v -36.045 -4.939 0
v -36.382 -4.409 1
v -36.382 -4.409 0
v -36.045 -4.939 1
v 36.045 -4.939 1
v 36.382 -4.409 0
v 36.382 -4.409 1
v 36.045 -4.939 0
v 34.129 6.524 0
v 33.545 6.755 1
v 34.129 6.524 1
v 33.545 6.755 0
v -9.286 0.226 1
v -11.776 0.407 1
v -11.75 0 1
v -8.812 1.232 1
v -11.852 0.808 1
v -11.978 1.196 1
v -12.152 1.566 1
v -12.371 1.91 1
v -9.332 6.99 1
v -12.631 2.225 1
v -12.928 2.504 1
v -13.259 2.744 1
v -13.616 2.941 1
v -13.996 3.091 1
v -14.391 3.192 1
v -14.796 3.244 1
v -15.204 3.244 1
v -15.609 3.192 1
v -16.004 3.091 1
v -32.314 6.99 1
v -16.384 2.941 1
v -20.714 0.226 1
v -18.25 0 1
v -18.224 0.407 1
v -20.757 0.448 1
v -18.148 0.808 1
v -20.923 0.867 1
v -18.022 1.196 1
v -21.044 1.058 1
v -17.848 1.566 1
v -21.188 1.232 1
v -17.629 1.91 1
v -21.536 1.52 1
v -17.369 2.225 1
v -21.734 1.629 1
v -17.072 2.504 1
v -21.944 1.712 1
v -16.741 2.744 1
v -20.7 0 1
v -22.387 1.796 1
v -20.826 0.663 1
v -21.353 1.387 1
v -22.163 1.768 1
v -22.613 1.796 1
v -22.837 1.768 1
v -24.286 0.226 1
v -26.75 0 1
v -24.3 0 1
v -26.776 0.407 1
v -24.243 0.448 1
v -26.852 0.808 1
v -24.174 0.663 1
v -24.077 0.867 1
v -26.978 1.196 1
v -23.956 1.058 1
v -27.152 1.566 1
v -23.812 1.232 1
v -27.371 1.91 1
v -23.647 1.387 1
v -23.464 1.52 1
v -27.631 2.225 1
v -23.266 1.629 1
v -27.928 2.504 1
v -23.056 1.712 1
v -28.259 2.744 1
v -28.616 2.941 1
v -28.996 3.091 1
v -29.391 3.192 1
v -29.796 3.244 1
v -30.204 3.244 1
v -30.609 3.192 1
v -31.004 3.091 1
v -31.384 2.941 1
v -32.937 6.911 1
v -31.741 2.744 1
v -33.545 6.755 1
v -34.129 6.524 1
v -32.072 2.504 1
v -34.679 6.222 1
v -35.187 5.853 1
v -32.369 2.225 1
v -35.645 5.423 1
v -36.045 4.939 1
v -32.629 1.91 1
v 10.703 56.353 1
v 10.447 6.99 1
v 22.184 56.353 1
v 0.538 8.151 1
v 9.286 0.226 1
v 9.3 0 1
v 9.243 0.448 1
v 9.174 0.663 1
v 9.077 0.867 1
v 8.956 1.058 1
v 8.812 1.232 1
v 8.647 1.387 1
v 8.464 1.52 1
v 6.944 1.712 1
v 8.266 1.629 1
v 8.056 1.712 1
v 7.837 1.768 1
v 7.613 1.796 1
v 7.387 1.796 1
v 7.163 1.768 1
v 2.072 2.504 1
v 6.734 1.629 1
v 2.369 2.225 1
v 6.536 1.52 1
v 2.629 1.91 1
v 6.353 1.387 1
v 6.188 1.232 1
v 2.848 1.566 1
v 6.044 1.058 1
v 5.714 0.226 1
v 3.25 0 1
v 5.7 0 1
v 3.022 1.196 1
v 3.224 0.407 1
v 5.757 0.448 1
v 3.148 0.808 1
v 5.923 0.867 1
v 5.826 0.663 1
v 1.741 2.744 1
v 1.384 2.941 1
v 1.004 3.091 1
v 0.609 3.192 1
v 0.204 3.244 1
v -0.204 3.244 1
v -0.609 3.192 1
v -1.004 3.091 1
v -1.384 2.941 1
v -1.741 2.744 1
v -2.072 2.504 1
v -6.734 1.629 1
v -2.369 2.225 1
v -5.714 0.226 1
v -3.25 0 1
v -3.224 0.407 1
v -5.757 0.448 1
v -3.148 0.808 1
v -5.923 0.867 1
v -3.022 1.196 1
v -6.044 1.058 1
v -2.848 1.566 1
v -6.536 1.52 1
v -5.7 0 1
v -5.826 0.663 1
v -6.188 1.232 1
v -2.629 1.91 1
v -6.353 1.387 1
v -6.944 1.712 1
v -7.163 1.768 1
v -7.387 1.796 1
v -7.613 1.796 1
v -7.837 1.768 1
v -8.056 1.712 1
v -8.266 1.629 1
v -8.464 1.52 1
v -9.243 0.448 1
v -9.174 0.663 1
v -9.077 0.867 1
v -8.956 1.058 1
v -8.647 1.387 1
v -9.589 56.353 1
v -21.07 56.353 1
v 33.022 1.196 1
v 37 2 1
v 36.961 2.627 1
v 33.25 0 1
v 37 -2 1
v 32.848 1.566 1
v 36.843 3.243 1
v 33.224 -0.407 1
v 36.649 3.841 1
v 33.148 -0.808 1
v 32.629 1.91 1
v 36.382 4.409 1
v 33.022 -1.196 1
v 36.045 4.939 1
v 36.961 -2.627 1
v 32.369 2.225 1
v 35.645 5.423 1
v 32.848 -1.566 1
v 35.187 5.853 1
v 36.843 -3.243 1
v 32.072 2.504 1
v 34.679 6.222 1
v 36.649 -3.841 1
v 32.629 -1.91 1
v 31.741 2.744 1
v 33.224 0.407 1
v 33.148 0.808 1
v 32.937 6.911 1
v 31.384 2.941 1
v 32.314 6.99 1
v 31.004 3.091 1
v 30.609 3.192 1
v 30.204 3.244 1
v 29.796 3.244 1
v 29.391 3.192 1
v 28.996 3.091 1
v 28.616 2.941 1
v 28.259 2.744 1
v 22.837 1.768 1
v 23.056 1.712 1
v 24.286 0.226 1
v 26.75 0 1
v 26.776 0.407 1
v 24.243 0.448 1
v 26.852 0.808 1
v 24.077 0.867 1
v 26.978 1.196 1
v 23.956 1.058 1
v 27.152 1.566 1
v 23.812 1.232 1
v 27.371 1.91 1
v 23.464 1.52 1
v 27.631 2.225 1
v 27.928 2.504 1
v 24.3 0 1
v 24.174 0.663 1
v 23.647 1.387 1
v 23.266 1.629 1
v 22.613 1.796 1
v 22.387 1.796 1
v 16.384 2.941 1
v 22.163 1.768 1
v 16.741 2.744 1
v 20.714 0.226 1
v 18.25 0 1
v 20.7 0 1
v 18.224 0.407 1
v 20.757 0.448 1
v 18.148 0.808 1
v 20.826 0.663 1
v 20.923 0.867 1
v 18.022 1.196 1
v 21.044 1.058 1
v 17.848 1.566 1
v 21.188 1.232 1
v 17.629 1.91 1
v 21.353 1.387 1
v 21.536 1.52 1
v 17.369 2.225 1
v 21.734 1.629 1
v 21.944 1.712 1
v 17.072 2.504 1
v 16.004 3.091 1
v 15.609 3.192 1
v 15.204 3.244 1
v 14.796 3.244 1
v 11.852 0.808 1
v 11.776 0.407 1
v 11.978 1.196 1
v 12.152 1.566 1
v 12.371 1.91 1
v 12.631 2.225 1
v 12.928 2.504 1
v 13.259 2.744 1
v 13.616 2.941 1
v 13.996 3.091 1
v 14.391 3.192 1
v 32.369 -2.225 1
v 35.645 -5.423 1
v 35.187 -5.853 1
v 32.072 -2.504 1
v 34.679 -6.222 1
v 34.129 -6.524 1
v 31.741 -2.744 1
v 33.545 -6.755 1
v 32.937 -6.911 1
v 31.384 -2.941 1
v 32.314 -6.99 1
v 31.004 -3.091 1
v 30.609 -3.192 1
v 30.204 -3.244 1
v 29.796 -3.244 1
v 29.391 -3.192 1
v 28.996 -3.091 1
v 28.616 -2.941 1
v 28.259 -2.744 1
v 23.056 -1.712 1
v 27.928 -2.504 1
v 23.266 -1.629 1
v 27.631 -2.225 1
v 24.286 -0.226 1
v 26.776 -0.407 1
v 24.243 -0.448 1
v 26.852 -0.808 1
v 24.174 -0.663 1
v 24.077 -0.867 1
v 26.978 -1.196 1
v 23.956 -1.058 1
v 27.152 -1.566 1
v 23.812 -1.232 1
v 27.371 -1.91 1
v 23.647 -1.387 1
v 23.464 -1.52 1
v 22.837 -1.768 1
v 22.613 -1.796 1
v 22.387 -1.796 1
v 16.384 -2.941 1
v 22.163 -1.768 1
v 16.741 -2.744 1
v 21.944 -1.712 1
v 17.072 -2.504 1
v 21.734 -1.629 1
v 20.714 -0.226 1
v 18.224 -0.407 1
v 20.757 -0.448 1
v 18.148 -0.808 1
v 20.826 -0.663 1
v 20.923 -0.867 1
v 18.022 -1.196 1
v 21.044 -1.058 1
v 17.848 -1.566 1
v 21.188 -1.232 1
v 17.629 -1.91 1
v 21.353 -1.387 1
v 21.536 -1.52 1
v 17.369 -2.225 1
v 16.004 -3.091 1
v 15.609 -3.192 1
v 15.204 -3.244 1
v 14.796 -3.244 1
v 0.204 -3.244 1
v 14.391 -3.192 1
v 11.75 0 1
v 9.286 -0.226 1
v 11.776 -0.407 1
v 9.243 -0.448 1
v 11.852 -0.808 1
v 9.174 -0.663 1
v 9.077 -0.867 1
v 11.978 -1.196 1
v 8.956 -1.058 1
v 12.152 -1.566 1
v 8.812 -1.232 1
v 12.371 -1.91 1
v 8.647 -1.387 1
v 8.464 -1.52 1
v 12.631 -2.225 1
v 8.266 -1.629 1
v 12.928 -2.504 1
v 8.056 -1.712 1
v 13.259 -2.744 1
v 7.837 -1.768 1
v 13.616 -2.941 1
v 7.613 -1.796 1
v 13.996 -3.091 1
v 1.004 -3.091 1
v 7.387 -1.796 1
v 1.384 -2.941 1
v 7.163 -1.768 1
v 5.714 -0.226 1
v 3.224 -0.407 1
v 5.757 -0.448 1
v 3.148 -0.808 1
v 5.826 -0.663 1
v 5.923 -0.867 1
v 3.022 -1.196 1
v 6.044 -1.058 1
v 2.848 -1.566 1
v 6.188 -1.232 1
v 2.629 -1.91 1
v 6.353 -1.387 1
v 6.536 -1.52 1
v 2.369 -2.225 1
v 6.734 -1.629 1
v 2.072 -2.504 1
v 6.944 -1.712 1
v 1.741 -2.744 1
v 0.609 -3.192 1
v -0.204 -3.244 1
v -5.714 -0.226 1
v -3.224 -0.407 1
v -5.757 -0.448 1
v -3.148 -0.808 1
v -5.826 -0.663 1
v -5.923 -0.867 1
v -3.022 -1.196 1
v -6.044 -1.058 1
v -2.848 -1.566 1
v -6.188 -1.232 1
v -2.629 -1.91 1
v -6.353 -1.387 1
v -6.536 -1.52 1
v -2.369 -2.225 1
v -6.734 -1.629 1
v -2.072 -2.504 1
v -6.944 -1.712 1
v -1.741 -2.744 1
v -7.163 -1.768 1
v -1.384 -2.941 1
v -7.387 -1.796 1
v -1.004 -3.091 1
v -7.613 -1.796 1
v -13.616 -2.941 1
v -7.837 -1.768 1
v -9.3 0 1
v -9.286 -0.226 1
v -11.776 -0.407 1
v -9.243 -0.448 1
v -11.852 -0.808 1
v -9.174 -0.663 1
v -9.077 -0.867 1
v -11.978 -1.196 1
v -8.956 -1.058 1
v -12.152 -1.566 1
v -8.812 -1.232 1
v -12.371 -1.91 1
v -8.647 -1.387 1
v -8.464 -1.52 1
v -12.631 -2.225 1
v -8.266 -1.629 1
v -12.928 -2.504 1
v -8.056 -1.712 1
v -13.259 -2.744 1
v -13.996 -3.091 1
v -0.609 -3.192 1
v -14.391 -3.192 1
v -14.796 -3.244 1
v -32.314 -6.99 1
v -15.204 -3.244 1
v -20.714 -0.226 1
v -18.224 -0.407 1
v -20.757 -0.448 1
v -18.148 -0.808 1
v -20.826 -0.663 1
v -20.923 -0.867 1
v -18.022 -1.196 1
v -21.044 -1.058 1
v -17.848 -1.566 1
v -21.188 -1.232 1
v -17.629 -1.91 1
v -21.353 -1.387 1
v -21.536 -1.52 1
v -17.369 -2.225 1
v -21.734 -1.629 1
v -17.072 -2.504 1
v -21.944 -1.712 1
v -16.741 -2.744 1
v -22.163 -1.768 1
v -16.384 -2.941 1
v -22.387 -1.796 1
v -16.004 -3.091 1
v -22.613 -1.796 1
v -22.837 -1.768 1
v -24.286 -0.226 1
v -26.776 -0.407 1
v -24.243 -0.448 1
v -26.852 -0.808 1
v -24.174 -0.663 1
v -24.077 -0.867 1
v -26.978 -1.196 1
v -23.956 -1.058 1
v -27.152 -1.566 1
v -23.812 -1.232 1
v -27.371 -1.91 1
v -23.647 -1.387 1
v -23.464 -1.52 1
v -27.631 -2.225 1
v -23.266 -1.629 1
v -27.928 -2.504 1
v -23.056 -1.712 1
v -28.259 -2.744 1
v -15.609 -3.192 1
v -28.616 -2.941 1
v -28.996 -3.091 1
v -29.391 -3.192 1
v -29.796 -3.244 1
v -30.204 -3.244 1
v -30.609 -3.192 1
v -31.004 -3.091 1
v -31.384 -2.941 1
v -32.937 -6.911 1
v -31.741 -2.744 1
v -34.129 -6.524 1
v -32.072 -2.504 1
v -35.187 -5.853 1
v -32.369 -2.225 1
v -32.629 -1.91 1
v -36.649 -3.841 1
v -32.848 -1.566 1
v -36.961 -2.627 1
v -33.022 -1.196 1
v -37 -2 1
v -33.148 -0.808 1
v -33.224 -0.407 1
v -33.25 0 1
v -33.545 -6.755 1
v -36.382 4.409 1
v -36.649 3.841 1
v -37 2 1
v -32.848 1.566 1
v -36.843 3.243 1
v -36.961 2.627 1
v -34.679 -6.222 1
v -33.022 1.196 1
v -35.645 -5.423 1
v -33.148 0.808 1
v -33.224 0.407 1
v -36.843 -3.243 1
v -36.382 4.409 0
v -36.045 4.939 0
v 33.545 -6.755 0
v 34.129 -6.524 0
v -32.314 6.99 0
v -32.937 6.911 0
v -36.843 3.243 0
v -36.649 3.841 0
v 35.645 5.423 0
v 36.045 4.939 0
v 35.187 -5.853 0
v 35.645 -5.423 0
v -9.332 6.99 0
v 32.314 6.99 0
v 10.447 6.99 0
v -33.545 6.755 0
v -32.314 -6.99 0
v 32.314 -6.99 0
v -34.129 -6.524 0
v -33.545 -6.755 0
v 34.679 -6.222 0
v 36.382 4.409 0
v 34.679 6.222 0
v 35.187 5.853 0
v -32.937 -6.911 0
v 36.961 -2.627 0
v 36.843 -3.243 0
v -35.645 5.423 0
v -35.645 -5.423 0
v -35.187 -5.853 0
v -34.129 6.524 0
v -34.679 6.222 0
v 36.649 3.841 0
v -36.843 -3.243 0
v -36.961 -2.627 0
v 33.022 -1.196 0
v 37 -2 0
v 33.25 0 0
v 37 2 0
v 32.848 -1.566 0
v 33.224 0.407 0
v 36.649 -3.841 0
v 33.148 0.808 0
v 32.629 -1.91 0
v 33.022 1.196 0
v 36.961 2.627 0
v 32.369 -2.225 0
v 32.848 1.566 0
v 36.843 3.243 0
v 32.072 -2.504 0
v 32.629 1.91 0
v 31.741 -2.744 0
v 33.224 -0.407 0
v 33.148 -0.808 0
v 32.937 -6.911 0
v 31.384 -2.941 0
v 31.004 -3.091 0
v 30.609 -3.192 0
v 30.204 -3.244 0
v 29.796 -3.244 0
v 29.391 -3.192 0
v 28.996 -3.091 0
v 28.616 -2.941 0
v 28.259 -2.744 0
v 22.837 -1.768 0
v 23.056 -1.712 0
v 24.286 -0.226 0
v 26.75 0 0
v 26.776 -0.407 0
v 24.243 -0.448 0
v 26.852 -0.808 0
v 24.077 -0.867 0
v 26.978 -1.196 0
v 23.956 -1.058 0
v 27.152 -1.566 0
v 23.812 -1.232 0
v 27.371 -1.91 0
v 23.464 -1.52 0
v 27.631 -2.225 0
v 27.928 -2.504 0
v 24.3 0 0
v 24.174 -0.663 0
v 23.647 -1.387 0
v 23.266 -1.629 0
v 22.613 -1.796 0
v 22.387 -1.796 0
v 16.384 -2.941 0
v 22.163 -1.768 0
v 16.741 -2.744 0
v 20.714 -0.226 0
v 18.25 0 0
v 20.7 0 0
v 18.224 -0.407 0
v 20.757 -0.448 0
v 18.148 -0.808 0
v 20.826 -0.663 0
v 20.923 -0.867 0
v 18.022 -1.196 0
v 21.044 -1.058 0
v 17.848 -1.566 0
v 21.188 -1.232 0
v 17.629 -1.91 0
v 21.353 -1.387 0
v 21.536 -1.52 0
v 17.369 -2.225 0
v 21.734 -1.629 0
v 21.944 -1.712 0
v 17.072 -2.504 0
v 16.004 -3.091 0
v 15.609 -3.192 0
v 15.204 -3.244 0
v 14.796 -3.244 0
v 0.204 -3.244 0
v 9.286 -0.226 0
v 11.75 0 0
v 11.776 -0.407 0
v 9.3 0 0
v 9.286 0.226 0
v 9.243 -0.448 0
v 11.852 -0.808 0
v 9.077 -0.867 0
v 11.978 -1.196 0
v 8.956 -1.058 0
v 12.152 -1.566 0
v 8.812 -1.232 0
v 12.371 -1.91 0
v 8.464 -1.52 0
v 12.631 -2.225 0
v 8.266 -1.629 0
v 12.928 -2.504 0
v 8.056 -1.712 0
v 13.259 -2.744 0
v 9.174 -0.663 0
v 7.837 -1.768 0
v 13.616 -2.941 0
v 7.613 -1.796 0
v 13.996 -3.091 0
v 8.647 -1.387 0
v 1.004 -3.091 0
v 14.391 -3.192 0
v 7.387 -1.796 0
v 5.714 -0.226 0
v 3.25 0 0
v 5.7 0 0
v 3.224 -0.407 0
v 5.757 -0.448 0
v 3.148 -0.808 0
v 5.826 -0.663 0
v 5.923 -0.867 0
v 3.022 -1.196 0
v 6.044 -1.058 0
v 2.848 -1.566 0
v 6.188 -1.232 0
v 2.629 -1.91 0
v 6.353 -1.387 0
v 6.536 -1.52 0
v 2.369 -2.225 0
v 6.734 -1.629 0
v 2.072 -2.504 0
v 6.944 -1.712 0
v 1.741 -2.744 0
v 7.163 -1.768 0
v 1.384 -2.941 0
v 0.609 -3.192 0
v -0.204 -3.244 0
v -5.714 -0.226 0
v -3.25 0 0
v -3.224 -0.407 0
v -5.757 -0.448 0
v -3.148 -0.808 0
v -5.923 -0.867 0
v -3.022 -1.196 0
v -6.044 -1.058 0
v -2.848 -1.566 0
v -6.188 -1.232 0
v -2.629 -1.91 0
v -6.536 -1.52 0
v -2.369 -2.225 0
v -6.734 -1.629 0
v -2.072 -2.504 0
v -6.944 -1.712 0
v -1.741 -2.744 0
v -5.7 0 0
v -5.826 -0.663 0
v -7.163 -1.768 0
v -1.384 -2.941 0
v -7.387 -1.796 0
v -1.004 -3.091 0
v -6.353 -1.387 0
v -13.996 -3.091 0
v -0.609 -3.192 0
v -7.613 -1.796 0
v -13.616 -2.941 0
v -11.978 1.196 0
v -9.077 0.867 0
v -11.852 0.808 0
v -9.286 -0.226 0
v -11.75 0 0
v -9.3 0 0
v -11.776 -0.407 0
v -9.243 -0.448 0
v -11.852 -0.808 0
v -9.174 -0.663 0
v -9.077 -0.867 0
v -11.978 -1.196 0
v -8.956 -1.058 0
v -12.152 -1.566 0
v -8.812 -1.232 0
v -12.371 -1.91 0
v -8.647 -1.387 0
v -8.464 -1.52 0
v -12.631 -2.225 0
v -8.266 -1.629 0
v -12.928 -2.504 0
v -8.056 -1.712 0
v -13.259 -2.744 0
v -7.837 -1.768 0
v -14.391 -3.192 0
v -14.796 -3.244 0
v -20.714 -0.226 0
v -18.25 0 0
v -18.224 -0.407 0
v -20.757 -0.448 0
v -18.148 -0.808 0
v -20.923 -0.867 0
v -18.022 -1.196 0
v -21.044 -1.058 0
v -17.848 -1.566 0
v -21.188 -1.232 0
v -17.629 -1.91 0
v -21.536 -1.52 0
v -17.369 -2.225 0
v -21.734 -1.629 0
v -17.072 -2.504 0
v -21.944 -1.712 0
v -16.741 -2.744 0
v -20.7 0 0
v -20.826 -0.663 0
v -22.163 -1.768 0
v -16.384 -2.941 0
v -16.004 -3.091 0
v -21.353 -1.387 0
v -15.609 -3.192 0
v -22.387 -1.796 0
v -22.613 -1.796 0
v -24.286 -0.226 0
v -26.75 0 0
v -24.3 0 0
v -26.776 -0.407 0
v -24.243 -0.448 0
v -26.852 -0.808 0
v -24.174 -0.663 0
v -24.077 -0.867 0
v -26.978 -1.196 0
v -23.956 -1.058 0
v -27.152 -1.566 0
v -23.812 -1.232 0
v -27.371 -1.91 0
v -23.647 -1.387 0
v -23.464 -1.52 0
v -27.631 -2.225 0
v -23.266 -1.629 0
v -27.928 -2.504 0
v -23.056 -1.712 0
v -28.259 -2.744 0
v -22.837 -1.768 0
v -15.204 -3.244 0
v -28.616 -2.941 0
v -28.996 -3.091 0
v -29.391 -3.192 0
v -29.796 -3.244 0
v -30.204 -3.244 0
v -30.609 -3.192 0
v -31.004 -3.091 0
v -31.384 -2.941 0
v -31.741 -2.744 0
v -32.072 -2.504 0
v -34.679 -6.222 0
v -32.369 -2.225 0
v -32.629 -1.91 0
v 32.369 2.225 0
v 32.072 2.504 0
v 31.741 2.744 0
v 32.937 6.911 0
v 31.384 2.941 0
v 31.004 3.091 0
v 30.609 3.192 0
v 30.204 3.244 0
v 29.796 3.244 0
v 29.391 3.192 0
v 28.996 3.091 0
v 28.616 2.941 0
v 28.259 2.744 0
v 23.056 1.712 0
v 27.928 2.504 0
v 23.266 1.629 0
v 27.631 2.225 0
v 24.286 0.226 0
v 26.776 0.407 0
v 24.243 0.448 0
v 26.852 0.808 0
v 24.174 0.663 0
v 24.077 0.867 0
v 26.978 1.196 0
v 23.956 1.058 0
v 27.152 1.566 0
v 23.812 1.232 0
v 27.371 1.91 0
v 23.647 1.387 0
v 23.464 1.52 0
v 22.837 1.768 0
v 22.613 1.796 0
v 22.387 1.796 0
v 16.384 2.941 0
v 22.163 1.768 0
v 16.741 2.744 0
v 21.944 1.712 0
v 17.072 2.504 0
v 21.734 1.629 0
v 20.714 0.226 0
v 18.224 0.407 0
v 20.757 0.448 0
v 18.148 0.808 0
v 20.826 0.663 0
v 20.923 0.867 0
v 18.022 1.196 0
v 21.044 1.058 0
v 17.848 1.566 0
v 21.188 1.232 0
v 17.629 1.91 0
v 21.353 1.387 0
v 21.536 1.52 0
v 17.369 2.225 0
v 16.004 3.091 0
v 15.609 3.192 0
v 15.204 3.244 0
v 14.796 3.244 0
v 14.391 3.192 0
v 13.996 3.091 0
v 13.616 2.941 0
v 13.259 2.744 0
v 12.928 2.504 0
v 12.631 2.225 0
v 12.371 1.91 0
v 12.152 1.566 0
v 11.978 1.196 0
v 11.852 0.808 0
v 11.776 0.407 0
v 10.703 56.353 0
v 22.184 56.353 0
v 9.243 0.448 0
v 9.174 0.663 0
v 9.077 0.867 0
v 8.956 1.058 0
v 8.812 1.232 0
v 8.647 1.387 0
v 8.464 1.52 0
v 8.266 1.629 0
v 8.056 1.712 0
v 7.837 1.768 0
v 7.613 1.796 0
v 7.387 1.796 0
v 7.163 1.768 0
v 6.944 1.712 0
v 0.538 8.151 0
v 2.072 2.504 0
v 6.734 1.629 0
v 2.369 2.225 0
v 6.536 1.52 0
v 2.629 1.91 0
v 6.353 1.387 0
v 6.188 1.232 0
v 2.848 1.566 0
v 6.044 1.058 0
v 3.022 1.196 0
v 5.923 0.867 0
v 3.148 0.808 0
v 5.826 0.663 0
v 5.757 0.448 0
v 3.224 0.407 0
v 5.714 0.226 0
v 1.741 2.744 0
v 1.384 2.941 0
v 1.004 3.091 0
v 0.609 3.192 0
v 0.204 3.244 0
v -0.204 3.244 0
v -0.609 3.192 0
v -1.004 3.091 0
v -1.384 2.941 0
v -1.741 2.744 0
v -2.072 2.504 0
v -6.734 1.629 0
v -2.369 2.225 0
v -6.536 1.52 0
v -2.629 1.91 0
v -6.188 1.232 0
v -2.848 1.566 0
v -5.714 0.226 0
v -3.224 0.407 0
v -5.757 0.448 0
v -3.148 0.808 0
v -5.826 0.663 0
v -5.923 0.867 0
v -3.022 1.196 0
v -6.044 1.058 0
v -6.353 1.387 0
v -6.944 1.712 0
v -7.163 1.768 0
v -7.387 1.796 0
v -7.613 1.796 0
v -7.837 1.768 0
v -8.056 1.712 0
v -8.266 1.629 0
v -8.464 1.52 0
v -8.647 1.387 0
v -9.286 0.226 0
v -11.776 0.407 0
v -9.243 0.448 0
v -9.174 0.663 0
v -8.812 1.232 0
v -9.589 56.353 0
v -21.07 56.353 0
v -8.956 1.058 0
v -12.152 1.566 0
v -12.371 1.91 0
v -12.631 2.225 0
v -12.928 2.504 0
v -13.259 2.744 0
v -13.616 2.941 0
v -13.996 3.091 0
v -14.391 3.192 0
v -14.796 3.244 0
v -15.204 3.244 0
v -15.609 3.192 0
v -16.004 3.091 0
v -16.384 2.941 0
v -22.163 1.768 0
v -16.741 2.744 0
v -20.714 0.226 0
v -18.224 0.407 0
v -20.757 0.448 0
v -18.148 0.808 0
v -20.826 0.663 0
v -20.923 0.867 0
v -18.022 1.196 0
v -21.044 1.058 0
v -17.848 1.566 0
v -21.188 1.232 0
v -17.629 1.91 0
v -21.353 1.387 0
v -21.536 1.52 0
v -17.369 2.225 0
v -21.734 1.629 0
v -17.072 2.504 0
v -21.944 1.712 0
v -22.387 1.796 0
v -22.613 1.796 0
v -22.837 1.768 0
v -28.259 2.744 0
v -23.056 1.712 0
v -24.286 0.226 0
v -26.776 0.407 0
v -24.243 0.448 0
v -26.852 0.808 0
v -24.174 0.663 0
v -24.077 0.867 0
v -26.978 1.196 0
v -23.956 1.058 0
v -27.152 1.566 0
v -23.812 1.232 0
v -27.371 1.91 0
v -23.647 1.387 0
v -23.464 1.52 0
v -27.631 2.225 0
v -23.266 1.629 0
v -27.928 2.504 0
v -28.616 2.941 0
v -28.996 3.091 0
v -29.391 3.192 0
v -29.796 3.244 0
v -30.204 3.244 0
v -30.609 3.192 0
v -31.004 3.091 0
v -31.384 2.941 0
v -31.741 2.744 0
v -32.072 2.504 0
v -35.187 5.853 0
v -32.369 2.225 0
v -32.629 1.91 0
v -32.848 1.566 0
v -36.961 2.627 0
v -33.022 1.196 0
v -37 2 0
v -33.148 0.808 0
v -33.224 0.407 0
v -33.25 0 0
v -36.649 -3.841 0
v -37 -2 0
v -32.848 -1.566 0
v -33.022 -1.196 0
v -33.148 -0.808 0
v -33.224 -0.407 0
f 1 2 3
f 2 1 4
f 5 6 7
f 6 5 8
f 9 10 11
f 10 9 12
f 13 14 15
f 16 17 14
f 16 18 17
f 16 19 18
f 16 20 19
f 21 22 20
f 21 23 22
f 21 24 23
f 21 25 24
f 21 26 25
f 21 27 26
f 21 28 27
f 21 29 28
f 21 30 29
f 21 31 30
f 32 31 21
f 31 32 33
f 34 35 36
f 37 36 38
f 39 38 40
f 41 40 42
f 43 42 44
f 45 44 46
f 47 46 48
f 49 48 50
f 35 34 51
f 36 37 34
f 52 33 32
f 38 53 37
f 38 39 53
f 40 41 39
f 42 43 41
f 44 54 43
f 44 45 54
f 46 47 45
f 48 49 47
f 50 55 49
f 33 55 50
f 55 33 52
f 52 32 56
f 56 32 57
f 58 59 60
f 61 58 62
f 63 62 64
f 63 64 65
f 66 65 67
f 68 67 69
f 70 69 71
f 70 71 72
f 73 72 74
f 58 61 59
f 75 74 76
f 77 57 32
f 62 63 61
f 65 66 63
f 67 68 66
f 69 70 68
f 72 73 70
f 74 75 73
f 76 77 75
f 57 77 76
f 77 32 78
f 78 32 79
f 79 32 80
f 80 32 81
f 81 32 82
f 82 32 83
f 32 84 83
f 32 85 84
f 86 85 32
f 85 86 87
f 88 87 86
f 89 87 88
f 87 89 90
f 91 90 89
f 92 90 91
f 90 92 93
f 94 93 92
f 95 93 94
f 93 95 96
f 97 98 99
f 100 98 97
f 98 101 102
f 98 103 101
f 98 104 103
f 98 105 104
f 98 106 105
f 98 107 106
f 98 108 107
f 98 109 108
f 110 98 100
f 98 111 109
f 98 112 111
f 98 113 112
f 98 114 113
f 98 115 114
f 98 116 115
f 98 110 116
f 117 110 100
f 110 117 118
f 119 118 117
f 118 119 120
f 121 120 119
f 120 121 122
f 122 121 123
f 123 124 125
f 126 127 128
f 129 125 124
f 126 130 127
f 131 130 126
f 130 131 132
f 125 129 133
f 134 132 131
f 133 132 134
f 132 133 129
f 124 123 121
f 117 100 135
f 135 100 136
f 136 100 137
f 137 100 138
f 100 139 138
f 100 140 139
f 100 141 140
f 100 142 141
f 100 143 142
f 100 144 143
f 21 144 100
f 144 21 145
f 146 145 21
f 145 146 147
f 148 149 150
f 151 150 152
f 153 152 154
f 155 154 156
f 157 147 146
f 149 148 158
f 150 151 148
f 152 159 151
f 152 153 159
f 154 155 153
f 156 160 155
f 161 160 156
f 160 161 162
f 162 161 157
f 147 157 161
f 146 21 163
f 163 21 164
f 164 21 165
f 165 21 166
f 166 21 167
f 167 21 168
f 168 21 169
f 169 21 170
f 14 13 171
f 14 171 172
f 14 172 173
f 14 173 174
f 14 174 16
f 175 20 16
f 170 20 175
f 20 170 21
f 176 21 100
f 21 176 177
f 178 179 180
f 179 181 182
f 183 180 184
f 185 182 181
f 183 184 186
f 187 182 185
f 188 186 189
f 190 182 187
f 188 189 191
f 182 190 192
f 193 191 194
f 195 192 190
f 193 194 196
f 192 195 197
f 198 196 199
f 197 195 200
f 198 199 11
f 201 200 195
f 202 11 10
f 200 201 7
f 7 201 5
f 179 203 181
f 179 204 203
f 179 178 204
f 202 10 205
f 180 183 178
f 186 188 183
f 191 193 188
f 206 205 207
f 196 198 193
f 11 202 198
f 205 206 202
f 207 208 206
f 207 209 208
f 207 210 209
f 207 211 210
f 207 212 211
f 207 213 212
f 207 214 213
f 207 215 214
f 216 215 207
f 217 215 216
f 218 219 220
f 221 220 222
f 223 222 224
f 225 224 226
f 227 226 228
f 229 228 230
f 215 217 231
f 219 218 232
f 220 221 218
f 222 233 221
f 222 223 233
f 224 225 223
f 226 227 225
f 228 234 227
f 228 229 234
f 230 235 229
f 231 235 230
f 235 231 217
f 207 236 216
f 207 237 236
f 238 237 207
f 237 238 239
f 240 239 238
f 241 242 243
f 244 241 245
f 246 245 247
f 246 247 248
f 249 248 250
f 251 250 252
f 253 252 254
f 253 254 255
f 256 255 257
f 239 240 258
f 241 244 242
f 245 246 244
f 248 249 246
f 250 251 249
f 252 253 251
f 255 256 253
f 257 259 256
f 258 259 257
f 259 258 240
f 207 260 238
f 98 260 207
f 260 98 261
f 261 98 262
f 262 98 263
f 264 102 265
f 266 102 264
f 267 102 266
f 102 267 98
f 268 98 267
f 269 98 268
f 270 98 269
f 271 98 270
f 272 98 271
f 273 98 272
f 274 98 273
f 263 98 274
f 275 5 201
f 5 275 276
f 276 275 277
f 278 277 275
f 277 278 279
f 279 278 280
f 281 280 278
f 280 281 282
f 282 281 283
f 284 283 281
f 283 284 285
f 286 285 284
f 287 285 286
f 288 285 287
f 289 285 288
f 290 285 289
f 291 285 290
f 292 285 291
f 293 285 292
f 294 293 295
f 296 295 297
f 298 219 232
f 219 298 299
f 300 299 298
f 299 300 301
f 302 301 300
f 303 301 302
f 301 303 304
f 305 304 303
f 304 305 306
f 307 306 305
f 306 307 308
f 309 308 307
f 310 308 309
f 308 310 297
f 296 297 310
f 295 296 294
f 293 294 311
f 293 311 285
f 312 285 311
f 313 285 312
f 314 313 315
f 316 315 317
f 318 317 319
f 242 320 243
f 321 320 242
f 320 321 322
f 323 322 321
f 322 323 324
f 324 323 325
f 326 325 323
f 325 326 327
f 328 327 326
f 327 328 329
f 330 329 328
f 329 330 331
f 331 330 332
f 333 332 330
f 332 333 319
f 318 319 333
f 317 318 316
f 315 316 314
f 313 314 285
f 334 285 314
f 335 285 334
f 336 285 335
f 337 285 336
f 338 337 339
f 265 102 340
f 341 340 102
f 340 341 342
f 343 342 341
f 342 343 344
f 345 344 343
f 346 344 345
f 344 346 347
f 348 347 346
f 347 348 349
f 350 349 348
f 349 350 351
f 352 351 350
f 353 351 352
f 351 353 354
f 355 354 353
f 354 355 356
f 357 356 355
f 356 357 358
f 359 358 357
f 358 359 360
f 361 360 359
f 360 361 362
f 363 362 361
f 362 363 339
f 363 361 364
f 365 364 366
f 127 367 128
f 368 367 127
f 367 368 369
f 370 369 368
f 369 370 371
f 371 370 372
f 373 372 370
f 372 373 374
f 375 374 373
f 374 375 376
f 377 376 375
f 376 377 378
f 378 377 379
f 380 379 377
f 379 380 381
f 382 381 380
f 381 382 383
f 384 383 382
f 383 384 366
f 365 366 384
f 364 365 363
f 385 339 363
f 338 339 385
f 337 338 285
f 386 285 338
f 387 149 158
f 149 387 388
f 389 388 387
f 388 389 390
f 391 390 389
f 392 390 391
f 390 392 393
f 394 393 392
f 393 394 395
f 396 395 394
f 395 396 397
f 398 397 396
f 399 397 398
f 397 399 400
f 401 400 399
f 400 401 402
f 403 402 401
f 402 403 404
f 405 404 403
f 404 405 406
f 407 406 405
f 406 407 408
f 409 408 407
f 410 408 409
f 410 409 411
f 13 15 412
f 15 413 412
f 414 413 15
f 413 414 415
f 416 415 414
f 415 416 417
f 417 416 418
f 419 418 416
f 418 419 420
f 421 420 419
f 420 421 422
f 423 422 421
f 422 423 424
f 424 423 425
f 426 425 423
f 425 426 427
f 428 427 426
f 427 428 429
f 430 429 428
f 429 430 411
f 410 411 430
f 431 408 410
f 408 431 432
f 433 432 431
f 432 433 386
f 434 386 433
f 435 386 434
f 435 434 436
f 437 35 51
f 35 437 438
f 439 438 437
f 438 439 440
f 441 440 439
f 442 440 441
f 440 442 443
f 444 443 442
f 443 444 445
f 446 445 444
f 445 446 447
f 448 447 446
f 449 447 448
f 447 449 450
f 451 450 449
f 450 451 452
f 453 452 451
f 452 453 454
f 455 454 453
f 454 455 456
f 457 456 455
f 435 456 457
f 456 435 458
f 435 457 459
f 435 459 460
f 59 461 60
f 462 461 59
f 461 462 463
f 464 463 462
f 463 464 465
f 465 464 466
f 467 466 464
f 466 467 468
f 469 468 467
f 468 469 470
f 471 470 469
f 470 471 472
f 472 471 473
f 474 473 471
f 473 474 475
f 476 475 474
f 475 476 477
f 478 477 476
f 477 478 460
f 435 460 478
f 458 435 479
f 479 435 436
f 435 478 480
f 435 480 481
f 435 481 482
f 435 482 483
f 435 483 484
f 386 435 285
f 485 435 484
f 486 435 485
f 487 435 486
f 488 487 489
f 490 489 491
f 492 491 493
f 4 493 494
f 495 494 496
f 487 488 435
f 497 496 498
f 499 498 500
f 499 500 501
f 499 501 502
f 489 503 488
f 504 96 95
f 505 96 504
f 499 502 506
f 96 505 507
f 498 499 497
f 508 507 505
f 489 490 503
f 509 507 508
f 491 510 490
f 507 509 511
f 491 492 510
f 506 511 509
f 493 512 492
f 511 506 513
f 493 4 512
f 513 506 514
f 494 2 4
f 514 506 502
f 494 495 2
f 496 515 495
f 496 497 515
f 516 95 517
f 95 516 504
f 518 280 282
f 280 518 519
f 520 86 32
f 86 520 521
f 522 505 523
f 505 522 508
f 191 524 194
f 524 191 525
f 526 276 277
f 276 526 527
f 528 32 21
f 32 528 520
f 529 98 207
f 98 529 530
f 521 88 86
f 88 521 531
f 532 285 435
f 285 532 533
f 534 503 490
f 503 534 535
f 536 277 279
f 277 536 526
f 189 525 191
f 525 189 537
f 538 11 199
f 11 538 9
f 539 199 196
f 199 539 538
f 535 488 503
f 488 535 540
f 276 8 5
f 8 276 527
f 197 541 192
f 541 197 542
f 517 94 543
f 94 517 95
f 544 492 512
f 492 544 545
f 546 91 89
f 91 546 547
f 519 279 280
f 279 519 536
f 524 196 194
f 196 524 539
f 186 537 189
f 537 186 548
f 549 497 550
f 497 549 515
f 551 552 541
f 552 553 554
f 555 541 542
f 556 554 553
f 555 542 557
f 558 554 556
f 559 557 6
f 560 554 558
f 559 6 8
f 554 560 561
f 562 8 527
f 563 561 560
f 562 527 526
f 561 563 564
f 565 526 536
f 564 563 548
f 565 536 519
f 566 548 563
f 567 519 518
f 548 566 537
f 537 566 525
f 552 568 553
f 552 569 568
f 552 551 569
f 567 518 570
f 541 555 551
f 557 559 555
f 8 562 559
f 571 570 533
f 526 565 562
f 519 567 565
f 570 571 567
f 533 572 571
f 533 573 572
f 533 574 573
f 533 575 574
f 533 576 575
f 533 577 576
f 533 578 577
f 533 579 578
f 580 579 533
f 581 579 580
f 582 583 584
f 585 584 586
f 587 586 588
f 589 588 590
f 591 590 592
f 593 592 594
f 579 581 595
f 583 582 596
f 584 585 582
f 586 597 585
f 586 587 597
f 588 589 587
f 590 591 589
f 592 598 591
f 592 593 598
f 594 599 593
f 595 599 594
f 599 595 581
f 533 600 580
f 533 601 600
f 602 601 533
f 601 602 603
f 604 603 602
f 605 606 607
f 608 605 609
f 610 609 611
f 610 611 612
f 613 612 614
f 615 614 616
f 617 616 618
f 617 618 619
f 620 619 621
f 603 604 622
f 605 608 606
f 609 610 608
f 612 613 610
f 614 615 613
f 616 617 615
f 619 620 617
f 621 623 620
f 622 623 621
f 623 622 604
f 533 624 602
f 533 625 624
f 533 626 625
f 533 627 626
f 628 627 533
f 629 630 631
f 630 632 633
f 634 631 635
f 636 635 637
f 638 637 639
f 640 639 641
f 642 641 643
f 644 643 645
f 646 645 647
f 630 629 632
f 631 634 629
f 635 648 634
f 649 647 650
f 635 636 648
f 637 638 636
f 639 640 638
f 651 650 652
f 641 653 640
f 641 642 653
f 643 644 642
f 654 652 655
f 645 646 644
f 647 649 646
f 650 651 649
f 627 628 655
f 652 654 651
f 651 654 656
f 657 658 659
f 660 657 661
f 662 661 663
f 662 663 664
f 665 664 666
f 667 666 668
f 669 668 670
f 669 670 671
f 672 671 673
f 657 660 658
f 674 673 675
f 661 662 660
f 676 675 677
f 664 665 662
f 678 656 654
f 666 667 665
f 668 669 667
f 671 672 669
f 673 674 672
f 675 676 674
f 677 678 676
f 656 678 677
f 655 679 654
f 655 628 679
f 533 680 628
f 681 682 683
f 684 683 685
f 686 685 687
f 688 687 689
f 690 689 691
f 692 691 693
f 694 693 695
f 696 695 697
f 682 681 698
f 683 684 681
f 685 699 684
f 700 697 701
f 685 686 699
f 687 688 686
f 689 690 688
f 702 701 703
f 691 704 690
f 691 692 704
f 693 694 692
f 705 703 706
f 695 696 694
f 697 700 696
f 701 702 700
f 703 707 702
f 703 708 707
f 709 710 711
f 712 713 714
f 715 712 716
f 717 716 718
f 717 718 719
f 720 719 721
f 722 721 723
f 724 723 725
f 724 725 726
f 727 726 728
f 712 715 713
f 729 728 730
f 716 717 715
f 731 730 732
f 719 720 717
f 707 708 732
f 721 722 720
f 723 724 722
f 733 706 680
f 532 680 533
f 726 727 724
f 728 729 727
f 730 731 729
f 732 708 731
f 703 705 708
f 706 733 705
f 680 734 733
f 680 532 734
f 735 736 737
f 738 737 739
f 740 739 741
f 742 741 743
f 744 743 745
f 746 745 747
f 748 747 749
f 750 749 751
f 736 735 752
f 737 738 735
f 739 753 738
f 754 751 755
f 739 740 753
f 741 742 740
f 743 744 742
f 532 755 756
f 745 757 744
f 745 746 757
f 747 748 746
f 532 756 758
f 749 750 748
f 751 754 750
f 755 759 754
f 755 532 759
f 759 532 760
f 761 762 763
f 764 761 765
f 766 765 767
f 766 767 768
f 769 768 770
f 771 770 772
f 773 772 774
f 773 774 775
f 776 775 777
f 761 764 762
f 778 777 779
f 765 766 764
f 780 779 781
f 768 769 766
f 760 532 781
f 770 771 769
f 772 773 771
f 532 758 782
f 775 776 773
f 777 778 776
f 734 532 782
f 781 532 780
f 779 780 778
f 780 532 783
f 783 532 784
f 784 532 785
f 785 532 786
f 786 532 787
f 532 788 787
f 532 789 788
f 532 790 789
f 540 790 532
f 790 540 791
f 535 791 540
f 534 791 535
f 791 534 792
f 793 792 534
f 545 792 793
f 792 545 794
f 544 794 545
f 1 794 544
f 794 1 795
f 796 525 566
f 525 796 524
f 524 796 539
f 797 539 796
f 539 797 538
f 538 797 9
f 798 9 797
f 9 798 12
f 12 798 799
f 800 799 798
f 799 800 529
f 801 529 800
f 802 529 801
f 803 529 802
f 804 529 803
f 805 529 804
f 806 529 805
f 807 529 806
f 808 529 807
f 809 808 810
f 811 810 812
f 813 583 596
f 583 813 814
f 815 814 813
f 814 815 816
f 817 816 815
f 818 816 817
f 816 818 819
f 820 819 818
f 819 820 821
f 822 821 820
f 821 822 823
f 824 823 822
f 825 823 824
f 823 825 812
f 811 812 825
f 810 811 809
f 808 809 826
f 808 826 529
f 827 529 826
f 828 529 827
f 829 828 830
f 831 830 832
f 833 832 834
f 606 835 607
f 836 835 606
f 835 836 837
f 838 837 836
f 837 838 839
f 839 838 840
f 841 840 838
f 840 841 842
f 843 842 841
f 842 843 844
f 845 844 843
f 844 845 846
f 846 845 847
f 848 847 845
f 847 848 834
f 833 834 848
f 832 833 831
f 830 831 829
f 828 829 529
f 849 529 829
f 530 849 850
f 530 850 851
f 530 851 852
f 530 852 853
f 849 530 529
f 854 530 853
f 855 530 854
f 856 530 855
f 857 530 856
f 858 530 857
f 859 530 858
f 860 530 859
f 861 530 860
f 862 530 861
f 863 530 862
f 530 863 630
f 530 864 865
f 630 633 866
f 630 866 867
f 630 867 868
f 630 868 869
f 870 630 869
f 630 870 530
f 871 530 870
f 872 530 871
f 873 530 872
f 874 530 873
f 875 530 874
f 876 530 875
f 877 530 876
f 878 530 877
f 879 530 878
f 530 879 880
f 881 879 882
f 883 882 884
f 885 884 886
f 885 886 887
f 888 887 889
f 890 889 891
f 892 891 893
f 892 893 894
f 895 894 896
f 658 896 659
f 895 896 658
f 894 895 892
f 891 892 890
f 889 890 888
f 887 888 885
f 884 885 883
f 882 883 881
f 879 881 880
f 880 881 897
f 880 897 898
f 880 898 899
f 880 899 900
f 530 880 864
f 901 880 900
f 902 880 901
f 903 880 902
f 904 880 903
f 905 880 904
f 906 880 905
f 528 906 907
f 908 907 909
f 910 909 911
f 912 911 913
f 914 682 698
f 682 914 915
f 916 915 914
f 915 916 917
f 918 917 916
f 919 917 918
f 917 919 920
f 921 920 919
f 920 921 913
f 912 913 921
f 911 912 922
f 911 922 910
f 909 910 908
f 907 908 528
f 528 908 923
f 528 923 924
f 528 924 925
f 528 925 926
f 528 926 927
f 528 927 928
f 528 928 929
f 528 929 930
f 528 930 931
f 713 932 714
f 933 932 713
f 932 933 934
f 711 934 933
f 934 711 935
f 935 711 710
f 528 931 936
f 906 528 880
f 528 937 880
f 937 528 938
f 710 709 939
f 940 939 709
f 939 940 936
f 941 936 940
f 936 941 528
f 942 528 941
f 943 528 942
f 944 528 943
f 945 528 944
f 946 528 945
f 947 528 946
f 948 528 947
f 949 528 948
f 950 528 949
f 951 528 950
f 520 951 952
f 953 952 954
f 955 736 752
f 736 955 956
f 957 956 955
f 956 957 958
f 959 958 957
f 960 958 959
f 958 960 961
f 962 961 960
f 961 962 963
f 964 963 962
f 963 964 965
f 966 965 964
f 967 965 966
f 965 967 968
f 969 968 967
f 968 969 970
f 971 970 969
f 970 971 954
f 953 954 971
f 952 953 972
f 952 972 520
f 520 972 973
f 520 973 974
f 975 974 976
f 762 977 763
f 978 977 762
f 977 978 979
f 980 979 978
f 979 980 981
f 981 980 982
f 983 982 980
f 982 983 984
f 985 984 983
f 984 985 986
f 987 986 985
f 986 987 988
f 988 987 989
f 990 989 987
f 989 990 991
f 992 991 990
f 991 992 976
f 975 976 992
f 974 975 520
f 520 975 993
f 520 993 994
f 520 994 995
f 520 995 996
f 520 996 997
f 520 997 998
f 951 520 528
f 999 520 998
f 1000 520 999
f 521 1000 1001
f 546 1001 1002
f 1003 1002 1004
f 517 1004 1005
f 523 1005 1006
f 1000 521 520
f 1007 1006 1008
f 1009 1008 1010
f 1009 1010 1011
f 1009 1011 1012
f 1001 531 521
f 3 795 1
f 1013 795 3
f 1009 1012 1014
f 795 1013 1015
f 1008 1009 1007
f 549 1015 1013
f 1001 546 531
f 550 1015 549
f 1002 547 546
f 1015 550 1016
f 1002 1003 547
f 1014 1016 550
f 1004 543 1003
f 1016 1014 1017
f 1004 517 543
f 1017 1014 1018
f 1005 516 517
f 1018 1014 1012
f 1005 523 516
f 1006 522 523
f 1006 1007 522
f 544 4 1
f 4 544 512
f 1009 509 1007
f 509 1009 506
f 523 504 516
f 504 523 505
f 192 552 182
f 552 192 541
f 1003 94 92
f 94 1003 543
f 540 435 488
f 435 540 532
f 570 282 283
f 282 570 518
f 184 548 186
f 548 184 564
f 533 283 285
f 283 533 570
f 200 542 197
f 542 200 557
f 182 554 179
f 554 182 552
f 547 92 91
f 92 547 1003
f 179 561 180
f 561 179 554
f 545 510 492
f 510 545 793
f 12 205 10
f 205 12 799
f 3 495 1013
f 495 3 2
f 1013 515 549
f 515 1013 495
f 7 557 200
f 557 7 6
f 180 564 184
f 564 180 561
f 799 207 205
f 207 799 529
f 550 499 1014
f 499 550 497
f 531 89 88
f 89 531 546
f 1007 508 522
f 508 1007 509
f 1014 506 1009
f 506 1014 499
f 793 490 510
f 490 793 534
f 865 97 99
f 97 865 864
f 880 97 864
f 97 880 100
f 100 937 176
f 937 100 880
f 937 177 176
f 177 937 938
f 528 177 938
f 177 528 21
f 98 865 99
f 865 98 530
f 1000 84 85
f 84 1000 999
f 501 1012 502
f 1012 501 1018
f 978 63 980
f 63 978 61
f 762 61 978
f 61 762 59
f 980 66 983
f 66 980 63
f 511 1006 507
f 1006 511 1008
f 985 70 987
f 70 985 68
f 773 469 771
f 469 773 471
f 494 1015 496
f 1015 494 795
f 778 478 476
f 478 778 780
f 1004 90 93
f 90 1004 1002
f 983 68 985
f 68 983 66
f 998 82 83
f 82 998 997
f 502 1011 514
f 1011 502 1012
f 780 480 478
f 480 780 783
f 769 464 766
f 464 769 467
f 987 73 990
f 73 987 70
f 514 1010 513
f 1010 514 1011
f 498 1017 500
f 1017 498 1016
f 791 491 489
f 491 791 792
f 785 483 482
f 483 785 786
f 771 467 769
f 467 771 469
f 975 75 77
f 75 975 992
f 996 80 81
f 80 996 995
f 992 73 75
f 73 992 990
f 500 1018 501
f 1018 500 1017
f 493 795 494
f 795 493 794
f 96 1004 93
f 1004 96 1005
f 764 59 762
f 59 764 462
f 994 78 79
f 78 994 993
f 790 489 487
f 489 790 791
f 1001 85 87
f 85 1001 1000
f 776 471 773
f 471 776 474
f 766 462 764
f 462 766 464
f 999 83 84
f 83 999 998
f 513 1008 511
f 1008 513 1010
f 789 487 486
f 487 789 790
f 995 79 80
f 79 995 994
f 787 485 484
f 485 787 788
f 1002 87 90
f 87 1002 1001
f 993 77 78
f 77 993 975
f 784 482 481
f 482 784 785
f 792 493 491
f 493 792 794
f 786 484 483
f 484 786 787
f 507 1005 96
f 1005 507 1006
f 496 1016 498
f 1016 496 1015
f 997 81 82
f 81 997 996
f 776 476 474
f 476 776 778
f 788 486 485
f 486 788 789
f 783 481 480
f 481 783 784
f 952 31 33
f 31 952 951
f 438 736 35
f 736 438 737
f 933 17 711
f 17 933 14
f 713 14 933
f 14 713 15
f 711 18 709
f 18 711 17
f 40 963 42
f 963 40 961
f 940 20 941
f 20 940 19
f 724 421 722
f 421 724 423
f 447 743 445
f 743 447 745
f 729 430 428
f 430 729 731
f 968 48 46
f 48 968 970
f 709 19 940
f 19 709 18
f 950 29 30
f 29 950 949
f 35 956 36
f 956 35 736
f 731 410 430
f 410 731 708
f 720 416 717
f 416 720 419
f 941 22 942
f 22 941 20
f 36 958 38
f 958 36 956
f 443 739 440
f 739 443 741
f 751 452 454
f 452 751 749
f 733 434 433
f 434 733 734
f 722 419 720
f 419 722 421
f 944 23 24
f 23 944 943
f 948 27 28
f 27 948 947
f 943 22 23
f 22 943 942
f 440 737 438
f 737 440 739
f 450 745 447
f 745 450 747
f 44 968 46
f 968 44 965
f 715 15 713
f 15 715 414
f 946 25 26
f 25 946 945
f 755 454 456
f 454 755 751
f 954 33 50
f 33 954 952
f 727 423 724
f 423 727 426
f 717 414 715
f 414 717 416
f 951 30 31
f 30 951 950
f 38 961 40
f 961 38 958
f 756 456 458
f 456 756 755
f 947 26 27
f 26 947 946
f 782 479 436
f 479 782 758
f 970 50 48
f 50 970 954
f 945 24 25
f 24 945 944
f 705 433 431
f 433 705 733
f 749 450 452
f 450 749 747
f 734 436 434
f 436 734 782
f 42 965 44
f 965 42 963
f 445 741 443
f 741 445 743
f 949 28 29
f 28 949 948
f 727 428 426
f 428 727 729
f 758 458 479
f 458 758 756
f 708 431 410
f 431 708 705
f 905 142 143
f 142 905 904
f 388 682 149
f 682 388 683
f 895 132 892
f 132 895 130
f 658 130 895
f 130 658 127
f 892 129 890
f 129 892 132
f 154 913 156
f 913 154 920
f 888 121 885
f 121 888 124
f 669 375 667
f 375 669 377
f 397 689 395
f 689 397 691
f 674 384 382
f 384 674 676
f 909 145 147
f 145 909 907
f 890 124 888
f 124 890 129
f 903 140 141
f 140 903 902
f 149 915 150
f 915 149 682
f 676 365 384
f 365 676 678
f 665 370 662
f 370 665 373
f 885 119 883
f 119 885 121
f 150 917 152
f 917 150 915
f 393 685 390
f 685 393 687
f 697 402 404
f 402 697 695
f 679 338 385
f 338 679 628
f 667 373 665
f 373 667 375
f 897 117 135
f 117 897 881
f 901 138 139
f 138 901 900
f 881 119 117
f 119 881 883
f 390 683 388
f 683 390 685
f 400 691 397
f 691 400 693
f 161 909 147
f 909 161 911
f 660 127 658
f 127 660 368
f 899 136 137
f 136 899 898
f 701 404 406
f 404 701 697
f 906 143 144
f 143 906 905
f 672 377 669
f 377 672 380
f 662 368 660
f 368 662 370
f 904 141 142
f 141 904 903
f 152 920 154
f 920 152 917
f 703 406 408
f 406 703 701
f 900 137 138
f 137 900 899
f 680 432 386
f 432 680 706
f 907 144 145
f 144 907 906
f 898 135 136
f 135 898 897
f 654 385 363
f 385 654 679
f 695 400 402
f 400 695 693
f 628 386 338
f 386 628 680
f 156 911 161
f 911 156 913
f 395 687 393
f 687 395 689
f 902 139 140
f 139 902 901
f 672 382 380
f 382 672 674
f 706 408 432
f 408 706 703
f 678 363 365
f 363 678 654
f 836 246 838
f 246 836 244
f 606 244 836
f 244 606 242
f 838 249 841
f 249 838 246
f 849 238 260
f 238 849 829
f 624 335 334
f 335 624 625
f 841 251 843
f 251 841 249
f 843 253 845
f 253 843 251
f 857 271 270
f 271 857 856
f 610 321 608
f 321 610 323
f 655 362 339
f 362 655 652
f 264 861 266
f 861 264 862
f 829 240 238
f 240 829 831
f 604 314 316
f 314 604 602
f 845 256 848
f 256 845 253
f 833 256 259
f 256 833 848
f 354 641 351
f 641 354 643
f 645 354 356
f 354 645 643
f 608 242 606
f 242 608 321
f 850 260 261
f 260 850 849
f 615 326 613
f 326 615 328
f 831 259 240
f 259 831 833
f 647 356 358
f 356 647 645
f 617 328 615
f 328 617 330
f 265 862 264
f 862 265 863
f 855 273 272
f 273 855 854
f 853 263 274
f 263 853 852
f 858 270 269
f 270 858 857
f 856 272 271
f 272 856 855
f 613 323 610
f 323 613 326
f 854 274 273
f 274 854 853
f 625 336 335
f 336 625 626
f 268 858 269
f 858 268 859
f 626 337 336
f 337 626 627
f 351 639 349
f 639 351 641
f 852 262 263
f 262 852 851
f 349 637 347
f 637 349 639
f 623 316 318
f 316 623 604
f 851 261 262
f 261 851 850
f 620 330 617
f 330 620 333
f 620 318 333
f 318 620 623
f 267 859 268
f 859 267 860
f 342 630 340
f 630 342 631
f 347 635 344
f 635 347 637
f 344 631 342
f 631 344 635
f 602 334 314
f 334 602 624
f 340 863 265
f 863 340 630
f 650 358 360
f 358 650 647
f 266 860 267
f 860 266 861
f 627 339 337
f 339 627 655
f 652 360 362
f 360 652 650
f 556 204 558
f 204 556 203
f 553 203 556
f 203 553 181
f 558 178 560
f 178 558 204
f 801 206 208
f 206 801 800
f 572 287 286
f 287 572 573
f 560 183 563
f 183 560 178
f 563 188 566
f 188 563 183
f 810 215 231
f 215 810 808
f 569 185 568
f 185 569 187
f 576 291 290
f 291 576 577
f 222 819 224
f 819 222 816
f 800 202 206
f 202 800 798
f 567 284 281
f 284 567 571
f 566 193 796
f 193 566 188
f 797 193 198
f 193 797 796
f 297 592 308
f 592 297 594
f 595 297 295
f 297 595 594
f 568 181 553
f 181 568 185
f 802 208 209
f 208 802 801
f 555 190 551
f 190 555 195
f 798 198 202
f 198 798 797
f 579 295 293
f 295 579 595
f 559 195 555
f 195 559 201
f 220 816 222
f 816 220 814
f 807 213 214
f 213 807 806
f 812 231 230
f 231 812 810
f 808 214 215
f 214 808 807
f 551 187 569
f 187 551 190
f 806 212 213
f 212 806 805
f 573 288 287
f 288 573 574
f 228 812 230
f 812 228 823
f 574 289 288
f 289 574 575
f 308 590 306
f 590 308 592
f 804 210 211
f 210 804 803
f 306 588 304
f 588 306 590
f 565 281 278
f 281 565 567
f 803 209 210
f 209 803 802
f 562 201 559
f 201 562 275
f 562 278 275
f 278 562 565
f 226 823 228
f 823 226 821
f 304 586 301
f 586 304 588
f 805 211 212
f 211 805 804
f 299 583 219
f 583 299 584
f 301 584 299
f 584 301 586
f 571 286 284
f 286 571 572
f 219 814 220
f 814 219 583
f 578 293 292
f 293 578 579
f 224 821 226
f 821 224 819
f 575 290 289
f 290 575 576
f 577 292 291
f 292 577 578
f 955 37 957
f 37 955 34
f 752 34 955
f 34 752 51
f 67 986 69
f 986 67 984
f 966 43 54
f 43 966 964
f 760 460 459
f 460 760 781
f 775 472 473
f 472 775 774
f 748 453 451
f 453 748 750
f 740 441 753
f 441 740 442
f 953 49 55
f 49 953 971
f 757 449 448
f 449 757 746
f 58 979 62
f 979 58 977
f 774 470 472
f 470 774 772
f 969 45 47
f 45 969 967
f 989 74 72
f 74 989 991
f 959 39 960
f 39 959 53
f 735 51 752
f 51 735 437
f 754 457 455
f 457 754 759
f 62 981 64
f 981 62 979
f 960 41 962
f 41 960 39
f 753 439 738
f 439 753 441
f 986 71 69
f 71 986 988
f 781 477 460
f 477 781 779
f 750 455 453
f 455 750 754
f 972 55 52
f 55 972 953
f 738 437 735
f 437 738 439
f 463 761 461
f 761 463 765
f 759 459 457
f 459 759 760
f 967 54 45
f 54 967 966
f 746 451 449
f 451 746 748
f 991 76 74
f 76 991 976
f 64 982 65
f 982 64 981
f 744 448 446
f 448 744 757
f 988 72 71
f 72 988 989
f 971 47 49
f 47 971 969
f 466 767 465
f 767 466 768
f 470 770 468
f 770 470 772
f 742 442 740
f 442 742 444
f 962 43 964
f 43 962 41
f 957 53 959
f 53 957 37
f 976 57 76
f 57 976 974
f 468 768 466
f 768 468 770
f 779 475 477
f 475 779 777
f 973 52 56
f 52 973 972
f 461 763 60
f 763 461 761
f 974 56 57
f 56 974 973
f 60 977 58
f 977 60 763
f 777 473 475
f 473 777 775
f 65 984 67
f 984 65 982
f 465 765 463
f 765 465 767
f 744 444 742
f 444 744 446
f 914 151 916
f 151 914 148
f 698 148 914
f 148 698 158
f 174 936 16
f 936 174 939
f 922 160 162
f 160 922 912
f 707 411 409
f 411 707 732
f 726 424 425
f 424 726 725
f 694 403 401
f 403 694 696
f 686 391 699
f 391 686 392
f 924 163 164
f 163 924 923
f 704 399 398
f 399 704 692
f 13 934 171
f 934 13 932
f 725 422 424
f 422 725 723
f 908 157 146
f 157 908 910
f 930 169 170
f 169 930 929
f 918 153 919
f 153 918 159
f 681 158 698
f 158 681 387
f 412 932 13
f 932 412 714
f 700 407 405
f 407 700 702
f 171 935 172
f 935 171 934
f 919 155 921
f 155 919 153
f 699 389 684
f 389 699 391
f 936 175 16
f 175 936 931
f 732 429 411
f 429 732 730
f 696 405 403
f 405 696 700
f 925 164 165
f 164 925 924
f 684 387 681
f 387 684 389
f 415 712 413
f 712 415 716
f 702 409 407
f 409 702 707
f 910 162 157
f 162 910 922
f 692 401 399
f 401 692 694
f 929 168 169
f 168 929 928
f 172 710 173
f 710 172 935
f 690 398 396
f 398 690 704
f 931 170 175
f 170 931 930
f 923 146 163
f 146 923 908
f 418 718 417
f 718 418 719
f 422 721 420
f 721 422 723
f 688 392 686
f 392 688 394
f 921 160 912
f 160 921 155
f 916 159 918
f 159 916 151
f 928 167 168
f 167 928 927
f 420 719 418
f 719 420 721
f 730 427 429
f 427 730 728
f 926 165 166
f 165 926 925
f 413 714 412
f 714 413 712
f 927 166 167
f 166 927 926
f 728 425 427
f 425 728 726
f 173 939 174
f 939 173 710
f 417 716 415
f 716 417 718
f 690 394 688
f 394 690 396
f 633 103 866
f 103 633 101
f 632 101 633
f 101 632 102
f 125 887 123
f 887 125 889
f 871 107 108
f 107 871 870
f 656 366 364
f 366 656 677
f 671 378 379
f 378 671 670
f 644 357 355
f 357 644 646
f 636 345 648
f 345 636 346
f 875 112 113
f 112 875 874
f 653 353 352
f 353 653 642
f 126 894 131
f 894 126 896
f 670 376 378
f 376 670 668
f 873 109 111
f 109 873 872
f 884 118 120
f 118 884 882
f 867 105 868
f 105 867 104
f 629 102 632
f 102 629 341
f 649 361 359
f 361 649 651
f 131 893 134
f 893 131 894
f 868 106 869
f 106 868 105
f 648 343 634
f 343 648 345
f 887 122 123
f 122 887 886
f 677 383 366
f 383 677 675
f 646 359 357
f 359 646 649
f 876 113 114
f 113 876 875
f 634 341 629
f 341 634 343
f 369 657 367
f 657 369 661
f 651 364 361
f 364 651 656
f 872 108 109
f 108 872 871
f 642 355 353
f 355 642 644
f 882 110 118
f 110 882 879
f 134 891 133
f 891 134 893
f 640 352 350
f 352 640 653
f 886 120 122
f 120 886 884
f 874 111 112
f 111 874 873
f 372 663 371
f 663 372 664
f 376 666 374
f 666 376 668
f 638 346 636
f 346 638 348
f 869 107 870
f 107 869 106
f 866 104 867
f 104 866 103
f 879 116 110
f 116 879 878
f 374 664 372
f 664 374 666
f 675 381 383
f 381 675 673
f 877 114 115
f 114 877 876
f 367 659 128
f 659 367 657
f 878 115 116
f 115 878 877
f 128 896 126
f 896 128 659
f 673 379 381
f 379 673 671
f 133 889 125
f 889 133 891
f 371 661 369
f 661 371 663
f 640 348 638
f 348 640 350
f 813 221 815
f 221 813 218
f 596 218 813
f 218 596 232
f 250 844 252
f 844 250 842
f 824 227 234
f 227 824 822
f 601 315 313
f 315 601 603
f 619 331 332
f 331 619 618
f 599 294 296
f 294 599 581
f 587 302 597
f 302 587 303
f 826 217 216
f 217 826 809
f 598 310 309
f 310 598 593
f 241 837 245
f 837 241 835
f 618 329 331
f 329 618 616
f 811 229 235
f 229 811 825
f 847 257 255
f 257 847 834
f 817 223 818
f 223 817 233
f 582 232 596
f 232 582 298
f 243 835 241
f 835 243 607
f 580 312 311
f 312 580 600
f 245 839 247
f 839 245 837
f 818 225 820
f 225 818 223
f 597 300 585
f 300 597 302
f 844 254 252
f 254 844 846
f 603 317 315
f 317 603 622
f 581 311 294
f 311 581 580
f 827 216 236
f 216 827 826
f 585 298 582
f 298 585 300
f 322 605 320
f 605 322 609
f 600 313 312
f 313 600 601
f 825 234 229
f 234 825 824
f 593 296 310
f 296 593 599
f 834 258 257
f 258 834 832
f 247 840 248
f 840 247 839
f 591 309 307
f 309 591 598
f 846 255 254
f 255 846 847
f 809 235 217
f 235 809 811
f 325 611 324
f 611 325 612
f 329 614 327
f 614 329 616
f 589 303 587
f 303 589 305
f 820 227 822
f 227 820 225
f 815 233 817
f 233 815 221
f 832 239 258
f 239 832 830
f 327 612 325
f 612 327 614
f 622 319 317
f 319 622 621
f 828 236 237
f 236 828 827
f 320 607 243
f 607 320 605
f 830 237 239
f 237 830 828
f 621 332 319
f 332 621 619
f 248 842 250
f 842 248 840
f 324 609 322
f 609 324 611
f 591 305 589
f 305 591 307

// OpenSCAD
$fn = 50;


difference() {
	union() {
		hull() {
			translate(v = [-32.0000000000, 2.0000000000, 0]) {
				cylinder(h = 1, r = 5);
			}
			translate(v = [32.0000000000, 2.0000000000, 0]) {
				cylinder(h = 1, r = 5);
			}
			translate(v = [-32.0000000000, -2.0000000000, 0]) {
				cylinder(h = 1, r = 5);
			}
			translate(v = [32.0000000000, -2.0000000000, 0]) {
				cylinder(h = 1, r = 5);
			}
		}
		translate(v = [0, 55, 0]) {
			linear_extrude(height = 1) {
				text(font = "DejaVu Sans Mono:style=Bold", halign = "center", size = 57.0000000000, text = "V", valign = "top");
			}
		}
	}
	union() {
		translate(v = [-30.0000000000, 0.0000000000, 0]) {
			translate(v = [0, 0, -100]) {
				cylinder(h = 200, r = 3.2500000000);
			}
		}
		translate(v = [-15.0000000000, 0.0000000000, 0]) {
			translate(v = [0, 0, -100]) {
				cylinder(h = 200, r = 3.2500000000);
			}
		}
		translate(v = [0, 0, -100]) {
			cylinder(h = 200, r = 3.2500000000);
		}
		translate(v = [15.0000000000, 0.0000000000, 0]) {
			translate(v = [0, 0, -100]) {
				cylinder(h = 200, r = 3.2500000000);
			}
		}
		translate(v = [30.0000000000, 0.0000000000, 0]) {
			translate(v = [0, 0, -100]) {
				cylinder(h = 200, r = 3.2500000000);
			}
		}
		translate(v = [-30.0000000000, 0.0000000000, 0]) {
			translate(v = [0, 0, -100]) {
				cylinder(h = 200, r = 1.8000000000);
			}
		}
		translate(v = [-22.5000000000, 0.0000000000, 0]) {
			translate(v = [0, 0, -100]) {
				cylinder(h = 200, r = 1.8000000000);
			}
		}
		translate(v = [-15.0000000000, 0.0000000000, 0]) {
			translate(v = [0, 0, -100]) {
				cylinder(h = 200, r = 1.8000000000);
			}
		}
		translate(v = [-7.5000000000, 0.0000000000, 0]) {
			translate(v = [0, 0, -100]) {
				cylinder(h = 200, r = 1.8000000000);
			}
		}
		translate(v = [0, 0, -100]) {
			cylinder(h = 200, r = 1.8000000000);
		}
		translate(v = [7.5000000000, 0.0000000000, 0]) {
			translate(v = [0, 0, -100]) {
				cylinder(h = 200, r = 1.8000000000);
			}
		}
		translate(v = [15.0000000000, 0.0000000000, 0]) {
			translate(v = [0, 0, -100]) {
				cylinder(h = 200, r = 1.8000000000);
			}
		}
		translate(v = [22.5000000000, 0.0000000000, 0]) {
			translate(v = [0, 0, -100]) {
				cylinder(h = 200, r = 1.8000000000);
			}
		}
		translate(v = [30.0000000000, 0.0000000000, 0]) {
			translate(v = [0, 0, -100]) {
				cylinder(h = 200, r = 1.8000000000);
			}
		}
	}
}
